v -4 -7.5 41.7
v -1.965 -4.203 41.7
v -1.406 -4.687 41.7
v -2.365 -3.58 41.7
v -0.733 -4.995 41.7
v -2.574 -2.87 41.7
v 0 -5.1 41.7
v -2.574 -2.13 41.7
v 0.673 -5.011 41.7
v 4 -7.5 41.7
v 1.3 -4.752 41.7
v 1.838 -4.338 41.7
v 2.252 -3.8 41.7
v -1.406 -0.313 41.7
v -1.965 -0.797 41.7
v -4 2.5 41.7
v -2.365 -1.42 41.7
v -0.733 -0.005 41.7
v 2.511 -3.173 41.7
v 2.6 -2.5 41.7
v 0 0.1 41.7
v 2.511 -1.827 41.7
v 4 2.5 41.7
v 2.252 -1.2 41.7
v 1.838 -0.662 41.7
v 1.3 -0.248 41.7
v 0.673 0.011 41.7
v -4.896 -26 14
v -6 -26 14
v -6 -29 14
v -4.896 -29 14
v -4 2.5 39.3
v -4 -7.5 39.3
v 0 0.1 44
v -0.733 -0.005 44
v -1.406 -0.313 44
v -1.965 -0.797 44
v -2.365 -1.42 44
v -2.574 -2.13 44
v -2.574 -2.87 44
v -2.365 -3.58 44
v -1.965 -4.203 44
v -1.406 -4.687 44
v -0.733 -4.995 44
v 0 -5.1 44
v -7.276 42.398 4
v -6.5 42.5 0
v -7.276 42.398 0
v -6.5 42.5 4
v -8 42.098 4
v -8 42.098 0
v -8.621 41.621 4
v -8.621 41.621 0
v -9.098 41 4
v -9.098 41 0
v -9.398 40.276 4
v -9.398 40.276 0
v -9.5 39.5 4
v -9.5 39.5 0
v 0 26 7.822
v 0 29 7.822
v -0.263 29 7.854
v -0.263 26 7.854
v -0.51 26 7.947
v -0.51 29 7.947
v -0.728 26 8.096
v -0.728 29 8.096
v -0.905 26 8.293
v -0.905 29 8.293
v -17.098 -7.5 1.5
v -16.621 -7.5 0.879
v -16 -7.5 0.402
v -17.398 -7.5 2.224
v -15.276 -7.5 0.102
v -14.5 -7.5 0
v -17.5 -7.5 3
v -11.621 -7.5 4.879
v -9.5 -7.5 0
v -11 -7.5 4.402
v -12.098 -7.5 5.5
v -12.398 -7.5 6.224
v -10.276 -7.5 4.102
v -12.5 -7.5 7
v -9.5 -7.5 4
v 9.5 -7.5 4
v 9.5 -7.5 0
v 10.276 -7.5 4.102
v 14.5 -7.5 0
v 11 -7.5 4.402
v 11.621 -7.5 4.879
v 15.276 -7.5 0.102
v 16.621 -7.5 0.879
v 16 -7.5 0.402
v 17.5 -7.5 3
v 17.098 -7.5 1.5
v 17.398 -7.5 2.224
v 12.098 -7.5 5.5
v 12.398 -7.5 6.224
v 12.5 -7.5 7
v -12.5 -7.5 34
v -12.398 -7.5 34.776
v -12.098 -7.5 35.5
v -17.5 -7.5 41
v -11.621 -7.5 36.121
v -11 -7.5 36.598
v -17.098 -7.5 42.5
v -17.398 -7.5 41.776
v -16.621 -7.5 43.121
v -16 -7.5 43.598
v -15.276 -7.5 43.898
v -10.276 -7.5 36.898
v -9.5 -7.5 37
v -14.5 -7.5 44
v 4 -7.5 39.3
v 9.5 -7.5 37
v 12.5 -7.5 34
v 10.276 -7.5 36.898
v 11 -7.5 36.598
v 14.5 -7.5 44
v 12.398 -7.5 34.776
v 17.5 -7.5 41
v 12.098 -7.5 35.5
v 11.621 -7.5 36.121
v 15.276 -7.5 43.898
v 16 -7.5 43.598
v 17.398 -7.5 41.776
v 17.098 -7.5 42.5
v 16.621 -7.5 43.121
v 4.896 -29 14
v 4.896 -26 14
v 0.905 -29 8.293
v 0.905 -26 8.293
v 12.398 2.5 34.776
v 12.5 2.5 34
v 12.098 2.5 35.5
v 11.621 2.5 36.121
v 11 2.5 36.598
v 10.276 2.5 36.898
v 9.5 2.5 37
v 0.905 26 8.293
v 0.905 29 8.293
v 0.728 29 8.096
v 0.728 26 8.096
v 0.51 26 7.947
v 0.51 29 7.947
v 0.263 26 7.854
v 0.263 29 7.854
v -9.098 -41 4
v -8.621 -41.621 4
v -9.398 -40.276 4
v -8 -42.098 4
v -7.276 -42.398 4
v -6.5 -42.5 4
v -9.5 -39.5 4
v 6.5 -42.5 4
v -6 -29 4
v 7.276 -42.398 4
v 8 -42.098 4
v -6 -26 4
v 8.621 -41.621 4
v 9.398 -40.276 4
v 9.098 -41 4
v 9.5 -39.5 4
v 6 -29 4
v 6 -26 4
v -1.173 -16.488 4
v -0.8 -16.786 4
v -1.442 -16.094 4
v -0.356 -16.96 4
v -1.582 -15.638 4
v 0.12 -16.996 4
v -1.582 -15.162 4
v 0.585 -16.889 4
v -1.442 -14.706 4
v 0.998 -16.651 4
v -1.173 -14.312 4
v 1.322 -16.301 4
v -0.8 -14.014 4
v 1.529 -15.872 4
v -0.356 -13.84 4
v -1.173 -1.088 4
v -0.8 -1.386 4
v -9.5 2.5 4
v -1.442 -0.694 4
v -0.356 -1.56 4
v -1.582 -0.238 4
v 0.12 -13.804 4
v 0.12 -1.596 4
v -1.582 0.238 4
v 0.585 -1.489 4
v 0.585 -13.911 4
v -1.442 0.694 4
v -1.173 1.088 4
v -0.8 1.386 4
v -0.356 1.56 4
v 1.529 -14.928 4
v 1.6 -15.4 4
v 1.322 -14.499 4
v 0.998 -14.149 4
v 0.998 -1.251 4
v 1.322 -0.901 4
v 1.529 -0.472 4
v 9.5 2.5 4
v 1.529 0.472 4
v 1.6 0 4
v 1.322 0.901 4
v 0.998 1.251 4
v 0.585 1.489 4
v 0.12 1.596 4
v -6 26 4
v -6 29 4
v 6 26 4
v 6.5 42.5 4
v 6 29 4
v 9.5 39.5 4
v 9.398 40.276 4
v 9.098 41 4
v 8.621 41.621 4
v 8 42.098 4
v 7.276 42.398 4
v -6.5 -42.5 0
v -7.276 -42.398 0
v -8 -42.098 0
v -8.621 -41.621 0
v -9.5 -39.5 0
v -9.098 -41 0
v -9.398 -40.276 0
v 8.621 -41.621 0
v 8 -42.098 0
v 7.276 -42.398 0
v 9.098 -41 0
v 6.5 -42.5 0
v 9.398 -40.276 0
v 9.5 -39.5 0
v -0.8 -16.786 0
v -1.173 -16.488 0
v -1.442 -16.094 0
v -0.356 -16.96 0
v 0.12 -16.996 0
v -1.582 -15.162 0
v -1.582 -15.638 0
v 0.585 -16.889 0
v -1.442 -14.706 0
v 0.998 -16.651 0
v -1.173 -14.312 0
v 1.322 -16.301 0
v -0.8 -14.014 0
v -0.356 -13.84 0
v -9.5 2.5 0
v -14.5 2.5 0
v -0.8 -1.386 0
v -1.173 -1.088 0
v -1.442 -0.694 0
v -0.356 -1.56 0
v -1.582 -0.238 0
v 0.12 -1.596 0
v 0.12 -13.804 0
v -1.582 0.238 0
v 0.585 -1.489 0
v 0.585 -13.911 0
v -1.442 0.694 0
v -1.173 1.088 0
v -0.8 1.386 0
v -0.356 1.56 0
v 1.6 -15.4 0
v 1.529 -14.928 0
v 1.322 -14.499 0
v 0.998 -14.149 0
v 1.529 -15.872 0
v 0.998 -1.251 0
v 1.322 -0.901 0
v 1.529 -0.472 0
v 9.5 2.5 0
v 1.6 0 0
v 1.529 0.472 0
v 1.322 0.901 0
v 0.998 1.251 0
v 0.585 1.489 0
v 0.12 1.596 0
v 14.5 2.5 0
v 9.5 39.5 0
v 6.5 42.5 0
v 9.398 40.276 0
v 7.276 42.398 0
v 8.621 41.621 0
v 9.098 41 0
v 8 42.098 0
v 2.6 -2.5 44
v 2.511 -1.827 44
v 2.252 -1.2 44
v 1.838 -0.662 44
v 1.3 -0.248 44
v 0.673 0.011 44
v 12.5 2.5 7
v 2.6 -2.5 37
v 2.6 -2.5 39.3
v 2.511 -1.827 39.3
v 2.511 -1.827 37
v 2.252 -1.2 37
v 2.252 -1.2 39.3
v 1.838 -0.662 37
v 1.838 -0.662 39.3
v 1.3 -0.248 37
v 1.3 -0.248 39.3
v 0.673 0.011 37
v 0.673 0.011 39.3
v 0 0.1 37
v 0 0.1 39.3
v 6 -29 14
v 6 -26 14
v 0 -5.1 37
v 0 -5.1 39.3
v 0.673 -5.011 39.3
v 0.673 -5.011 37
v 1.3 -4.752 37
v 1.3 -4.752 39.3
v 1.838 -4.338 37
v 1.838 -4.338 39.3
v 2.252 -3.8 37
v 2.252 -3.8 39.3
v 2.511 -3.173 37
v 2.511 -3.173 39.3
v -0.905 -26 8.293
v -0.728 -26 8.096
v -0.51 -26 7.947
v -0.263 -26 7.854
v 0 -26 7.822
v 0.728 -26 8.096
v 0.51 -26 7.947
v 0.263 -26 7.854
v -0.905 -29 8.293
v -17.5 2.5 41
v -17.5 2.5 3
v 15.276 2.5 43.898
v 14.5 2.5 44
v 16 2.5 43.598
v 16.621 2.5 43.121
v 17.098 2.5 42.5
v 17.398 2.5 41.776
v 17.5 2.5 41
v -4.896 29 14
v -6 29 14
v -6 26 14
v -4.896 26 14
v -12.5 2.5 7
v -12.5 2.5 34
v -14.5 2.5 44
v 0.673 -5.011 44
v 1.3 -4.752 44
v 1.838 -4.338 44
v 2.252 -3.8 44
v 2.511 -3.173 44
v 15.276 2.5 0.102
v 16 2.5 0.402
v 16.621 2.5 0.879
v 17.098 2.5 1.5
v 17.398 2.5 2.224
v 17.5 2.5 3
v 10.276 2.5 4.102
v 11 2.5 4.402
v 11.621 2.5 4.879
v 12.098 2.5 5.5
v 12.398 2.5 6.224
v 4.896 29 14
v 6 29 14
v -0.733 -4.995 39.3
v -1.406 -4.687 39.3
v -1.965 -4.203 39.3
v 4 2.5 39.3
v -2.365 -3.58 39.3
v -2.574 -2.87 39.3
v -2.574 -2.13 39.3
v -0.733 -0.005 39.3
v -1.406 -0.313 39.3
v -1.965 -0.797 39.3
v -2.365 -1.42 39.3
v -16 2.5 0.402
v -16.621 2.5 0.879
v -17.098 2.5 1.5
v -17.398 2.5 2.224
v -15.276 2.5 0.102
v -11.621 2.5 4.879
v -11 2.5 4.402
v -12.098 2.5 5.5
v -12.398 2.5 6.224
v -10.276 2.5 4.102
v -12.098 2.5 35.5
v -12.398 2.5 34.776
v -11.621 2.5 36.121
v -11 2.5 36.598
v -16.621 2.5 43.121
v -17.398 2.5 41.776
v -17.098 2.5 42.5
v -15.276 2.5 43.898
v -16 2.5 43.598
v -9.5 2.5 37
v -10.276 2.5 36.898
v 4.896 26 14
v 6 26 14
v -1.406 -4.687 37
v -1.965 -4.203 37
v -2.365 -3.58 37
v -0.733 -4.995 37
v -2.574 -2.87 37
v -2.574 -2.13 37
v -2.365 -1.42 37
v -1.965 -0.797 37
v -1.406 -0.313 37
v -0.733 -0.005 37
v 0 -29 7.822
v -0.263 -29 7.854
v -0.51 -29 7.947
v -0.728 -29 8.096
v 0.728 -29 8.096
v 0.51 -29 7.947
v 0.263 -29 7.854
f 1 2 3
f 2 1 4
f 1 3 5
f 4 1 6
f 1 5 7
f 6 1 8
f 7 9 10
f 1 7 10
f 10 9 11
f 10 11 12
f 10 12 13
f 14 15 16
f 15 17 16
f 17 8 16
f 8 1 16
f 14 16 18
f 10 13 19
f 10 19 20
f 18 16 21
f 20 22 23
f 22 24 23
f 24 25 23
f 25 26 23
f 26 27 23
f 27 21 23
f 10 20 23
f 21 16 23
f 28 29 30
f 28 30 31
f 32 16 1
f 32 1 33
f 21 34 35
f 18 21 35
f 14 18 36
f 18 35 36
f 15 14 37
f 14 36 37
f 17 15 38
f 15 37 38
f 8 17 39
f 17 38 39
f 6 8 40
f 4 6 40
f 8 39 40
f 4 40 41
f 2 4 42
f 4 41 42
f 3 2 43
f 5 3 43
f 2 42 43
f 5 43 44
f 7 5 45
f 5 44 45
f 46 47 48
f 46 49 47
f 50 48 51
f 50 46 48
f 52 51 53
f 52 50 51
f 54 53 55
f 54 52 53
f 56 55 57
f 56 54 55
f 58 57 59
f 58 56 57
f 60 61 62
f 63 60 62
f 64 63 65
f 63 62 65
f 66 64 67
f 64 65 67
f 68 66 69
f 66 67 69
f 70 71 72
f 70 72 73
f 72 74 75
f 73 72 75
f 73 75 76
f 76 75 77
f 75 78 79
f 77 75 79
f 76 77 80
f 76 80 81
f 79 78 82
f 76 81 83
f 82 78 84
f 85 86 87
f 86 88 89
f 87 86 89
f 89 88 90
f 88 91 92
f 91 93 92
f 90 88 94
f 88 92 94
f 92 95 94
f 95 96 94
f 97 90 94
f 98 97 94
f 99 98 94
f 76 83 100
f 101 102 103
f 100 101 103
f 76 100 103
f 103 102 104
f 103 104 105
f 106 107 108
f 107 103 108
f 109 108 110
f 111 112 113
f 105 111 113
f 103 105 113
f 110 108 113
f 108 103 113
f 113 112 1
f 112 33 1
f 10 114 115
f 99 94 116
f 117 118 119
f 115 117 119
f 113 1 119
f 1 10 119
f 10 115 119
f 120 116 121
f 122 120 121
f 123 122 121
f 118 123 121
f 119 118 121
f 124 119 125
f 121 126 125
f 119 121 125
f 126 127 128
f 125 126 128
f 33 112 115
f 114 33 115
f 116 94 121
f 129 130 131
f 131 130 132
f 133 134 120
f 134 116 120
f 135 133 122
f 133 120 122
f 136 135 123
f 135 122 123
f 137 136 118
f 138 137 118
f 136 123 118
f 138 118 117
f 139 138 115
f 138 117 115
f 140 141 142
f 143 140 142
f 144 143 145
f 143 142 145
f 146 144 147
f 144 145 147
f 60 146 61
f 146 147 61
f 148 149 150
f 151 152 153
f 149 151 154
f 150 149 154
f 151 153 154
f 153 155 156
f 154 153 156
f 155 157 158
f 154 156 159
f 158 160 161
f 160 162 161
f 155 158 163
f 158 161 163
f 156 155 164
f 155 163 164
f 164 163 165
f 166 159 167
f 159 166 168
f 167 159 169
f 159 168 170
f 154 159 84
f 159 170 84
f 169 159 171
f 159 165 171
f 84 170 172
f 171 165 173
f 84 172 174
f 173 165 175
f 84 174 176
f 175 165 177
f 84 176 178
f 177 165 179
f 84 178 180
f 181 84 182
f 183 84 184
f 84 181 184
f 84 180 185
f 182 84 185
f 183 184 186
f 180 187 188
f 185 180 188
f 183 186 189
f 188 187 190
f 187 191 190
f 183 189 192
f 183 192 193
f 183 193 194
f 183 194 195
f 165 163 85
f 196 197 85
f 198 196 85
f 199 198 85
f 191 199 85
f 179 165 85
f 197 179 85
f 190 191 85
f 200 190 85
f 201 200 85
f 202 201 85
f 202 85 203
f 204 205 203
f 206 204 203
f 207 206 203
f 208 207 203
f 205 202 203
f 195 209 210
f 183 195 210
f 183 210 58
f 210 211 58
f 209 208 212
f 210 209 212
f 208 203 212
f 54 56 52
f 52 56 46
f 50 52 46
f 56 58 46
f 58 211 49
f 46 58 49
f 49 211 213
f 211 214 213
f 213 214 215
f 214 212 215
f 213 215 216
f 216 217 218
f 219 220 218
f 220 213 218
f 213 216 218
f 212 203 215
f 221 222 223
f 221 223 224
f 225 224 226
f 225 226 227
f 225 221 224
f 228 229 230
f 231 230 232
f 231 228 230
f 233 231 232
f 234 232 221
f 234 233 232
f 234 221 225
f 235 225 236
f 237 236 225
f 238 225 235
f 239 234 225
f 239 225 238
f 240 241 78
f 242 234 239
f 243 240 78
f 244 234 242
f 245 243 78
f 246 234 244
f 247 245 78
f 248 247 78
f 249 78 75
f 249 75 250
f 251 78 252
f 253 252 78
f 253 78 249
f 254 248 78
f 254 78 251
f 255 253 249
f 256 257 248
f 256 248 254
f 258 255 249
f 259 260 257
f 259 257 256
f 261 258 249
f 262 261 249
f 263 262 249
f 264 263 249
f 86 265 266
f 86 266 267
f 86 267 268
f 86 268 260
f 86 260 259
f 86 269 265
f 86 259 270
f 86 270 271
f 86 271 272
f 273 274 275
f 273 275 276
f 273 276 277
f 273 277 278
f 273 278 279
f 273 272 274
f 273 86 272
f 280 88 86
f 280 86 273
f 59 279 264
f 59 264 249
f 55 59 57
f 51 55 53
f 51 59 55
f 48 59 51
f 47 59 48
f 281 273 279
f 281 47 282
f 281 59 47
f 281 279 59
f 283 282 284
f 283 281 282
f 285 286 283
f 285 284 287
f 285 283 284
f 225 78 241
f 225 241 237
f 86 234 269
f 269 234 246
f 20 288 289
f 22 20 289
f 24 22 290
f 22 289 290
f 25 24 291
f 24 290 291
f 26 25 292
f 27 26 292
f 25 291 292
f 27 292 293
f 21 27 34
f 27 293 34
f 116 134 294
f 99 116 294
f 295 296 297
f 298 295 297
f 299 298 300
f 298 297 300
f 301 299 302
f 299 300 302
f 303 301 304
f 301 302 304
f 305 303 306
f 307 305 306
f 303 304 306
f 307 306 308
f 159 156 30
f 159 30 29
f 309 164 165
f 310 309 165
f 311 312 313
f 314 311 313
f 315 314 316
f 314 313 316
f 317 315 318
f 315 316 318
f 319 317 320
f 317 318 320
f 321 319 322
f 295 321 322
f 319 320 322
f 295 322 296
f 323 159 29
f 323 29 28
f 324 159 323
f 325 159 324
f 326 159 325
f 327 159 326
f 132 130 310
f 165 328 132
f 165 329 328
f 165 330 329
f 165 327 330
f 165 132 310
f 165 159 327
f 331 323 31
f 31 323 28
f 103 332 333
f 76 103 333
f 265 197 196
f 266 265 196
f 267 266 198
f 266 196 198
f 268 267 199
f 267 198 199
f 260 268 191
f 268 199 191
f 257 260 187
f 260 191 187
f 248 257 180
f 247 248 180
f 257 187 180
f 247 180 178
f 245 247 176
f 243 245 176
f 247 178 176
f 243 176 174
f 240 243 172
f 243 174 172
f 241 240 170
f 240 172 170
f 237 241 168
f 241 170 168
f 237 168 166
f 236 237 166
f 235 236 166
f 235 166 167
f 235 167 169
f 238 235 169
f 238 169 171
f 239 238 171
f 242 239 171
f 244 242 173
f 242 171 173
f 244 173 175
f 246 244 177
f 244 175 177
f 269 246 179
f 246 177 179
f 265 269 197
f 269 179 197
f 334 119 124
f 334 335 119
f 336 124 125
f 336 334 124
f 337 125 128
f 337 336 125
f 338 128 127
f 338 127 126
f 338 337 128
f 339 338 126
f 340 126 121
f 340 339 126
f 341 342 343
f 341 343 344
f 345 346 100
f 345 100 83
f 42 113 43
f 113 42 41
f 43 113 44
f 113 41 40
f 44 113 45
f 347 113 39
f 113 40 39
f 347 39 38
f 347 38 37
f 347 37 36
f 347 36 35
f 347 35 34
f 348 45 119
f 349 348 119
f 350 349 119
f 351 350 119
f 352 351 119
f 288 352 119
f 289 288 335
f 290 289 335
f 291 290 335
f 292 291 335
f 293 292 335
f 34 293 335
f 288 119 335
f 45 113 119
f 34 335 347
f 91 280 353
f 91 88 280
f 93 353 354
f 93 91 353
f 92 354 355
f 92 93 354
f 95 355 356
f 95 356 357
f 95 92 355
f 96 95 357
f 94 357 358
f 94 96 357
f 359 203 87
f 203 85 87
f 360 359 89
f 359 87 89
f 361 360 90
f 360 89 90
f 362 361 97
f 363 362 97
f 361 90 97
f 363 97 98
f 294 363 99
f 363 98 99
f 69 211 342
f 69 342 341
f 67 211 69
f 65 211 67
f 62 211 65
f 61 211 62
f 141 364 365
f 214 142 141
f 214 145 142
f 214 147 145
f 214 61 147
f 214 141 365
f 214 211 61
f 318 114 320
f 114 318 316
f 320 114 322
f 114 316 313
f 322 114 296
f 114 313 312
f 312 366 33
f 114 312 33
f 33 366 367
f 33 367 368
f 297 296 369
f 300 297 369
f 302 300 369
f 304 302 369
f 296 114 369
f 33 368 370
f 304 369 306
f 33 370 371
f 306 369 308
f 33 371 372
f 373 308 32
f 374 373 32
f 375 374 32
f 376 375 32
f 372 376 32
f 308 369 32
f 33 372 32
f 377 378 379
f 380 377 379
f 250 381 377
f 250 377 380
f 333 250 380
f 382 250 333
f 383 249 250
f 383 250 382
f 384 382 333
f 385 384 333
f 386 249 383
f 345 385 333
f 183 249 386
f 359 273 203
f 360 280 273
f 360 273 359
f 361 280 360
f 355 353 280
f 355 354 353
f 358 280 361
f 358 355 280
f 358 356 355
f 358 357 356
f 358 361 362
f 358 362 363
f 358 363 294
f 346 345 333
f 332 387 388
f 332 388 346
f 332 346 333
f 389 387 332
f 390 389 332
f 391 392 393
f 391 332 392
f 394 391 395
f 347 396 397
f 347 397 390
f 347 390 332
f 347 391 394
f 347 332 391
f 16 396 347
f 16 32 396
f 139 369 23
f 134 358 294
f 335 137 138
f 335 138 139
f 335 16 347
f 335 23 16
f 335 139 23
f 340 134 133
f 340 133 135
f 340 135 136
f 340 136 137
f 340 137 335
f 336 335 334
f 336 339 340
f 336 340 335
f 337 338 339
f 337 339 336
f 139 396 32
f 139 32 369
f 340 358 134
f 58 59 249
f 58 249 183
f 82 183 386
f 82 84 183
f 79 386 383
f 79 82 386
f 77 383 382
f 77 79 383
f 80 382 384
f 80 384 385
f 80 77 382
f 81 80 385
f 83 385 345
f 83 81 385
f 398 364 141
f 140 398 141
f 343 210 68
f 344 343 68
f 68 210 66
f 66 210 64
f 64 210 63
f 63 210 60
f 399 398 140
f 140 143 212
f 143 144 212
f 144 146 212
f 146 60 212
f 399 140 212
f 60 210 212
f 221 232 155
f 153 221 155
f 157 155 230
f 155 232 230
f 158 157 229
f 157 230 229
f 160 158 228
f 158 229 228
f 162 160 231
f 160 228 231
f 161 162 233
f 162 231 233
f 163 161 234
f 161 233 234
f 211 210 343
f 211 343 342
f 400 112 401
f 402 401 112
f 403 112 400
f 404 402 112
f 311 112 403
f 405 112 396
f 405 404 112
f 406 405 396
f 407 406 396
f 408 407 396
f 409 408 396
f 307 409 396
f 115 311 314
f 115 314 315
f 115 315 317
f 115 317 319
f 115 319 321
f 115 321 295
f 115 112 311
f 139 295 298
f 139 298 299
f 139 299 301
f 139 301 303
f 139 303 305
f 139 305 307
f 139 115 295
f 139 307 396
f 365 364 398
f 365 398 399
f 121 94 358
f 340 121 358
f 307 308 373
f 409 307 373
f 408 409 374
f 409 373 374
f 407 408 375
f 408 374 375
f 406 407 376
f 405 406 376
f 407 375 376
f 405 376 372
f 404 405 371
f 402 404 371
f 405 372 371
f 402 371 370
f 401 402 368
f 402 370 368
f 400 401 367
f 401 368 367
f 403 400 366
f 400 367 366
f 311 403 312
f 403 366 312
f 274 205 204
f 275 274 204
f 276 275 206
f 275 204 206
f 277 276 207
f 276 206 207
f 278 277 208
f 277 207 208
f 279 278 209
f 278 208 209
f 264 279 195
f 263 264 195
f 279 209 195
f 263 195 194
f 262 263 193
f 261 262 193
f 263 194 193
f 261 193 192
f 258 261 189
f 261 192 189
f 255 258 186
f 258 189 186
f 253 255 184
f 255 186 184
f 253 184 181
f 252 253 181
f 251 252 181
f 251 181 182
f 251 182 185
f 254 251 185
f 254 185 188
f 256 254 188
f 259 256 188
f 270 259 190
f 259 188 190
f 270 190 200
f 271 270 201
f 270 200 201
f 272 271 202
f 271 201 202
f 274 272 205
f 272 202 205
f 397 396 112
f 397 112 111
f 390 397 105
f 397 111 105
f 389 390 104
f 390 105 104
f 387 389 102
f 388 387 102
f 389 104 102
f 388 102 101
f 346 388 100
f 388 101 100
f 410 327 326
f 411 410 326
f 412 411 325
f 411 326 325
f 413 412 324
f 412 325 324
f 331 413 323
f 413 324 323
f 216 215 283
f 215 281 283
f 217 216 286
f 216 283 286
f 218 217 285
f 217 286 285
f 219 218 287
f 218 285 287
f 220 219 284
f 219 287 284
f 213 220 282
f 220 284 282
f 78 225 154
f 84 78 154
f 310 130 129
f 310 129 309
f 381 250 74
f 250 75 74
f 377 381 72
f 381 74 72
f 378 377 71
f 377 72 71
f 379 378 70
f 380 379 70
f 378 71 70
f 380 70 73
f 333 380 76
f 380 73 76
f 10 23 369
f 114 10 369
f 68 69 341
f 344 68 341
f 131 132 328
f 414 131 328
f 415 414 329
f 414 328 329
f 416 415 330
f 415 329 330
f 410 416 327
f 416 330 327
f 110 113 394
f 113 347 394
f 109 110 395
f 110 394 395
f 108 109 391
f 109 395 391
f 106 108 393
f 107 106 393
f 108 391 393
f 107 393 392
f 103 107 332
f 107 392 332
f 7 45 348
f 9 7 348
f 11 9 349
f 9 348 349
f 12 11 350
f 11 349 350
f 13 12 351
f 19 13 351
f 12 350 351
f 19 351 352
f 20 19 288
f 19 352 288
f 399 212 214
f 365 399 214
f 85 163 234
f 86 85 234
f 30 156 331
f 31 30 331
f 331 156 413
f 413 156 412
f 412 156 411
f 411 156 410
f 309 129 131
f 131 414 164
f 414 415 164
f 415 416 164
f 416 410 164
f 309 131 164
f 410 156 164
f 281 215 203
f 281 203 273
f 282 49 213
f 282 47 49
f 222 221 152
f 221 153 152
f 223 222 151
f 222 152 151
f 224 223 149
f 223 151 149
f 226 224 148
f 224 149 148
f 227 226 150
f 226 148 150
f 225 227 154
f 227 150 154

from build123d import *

# Parameters (mm, degrees)
SKETCH1_W           = 15
SKETCH1_H           = 85
BOSS_EXTRUDE1_DEPTH = 4
SKETCH2_W           = 12
SKETCH2_H           = 3
BOSS_EXTRUDE2_DEPTH = 10
CUT_EXTRUDE1_DEPTH  = 60
SKETCH4_R           = 1.6
CUT_EXTRUDE2_DEPTH  = 4
SKETCH5_W           = 10
SKETCH5_H           = 4
BOSS_EXTRUDE3_DEPTH = 50
SKETCH8_W           = 10
SKETCH8_H           = 40
CUT_EXTRUDE3_DEPTH  = 4
SKETCH10_W          = 10
SKETCH10_H          = 10
BOSS_EXTRUDE4_DEPTH = 40
SKETCH11_W          = 7
SKETCH11_H          = 10
BOSS_EXTRUDE5_DEPTH = 15
SKETCH13_W          = 5
SKETCH13_H          = 33
CUT_EXTRUDE4_DEPTH  = 10
CUT_EXTRUDE6_DEPTH  = 7
SKETCH17_W          = 4
SKETCH17_H          = 35
SKETCH17_H_2        = 40
BOSS_EXTRUDE6_DEPTH = 2
SKETCH18_W          = 4
SKETCH18_H          = 35
SKETCH18_H_2        = 40
BOSS_EXTRUDE7_DEPTH = 2
FILLET2_R           = 3
SKETCH19_W          = 4
SKETCH19_H          = 2.4
CUT_EXTRUDE7_DEPTH  = 10


with BuildPart() as part:
    # Sketch1 → Boss-Extrude1 (new body)
    with BuildSketch(Plane.XY):
        Rectangle(SKETCH1_W, SKETCH1_H)
    extrude(amount=BOSS_EXTRUDE1_DEPTH)

    # Sketch2 → Boss-Extrude2 (add)
    with BuildSketch(Plane.XY.offset(4)):
        with Locations((0, 27.5)):
            Rectangle(SKETCH2_W, SKETCH2_H)
        with Locations((0, -27.5)):
            Rectangle(SKETCH2_W, SKETCH2_H)
    extrude(amount=BOSS_EXTRUDE2_DEPTH)

    # Sketch3 → Cut-Extrude1 (cut)
    with BuildSketch(Plane(origin=(0, 29, 0), x_dir=(1, 0, 0), z_dir=(0, 1, 0))):
        with BuildLine():
            Line((0, -7.82217465), (0, -14))
            Line((0, -14), (4.896029025, -14))
            Line((4.896029025, -14), (0.904649293, -8.293404311))
            ThreePointArc((0.904649293, -8.293404311), (0.5100117, -7.947044007), (0, -7.82217465))
        make_face()
        with BuildLine():
            Line((-4.896029025, -14), (0, -14))
            Line((0, -14), (0, -7.82217465))
            ThreePointArc((0, -7.82217465), (-0.5100117, -7.947044007), (-0.904649293, -8.293404311))
            Line((-0.904649293, -8.293404311), (-4.896029025, -14))
        make_face()
    extrude(amount=-CUT_EXTRUDE1_DEPTH, mode=Mode.SUBTRACT)

    # Sketch4 → Cut-Extrude2 (cut)
    with BuildSketch(Plane.XY.offset(4)):
        with Locations((0, -15.4)):
            Circle(SKETCH4_R)
        Circle(SKETCH4_R)
    extrude(amount=-CUT_EXTRUDE2_DEPTH, mode=Mode.SUBTRACT)

    # Sketch5 → Boss-Extrude3 (add)
    with BuildSketch(Plane(origin=(0, 42.5, 0), x_dir=(1, 0, 0), z_dir=(0, 1, 0))):
        with Locations((12.5, -2)):
            Rectangle(SKETCH5_W, SKETCH5_H)
        with Locations((-12.5, -2)):
            Rectangle(SKETCH5_W, SKETCH5_H)
    extrude(amount=-BOSS_EXTRUDE3_DEPTH)

    # Sketch8 → Cut-Extrude3 (cut)
    with BuildSketch(Plane.XY.offset(4)):
        with Locations((12.5, 22.5)):
            Rectangle(SKETCH8_W, SKETCH8_H)
        with Locations((-12.5, 22.5)):
            Rectangle(SKETCH8_W, SKETCH8_H)
    extrude(amount=-CUT_EXTRUDE3_DEPTH, mode=Mode.SUBTRACT)

    # Sketch10 → Boss-Extrude4 (add)
    with BuildSketch(Plane.XY.offset(4)):
        with Locations((12.5, -2.5)):
            Rectangle(SKETCH10_W, SKETCH10_H)
        with Locations((-12.5, -2.5)):
            Rectangle(SKETCH10_W, SKETCH10_H)
    extrude(amount=BOSS_EXTRUDE4_DEPTH)

    # Sketch11 → Boss-Extrude5 (add)
    with BuildSketch(Plane.ZY.offset(-7.5)):
        with Locations((40.5, -2.5)):
            Rectangle(SKETCH11_W, SKETCH11_H)
    extrude(amount=BOSS_EXTRUDE5_DEPTH)

    # Sketch13 → Cut-Extrude4 (cut)
    with BuildSketch(Plane(origin=(0, 2.5, 0), x_dir=(1, 0, 0), z_dir=(0, 1, 0))):
        with Locations((-10, -20.5)):
            Rectangle(SKETCH13_W, SKETCH13_H)
        with Locations((10, -20.5)):
            Rectangle(SKETCH13_W, SKETCH13_H)
    extrude(amount=-CUT_EXTRUDE4_DEPTH, mode=Mode.SUBTRACT)

    # Sketch14 → Cut-Extrude6 (cut)
    with BuildSketch(Plane.XY.offset(44)):
        with BuildLine():
            ThreePointArc((0, 0.1), (-2.6, -2.5), (0, -5.1))
            Line((0, -5.1), (0, 0.1))
        make_face()
        with BuildLine():
            Line((0, 0.1), (0, -5.1))
            ThreePointArc((0, -5.1), (1.838477631, -4.338477631), (2.6, -2.5))
            ThreePointArc((2.6, -2.5), (1.838477631, -0.661522369), (0, 0.1))
        make_face()
    extrude(amount=-CUT_EXTRUDE6_DEPTH, mode=Mode.SUBTRACT)

    # Sketch17 → Boss-Extrude6 (add)
    with BuildSketch(Plane(origin=(7.5, 0, 0), x_dir=(0, 0, -1), z_dir=(1, 0, 0))):
        with Locations((-2, -25)):
            Rectangle(SKETCH17_W, SKETCH17_H)
        with Locations((-2, 22.5)):
            Rectangle(SKETCH17_W, SKETCH17_H_2)
    extrude(amount=BOSS_EXTRUDE6_DEPTH)

    # Sketch18 → Boss-Extrude7 (add)
    with BuildSketch(Plane.ZY.offset(7.5)):
        with Locations((2, -25)):
            Rectangle(SKETCH18_W, SKETCH18_H)
        with Locations((2, 22.5)):
            Rectangle(SKETCH18_W, SKETCH18_H_2)
    extrude(amount=BOSS_EXTRUDE7_DEPTH)

    # Fillet2
    fillet2_edges = [part.edges().sort_by_distance(p)[0] for p in [
        (9.5, -42.5, 2),
        (-9.5, -42.5, 2),
        (9.5, 42.5, 2),
        (-9.5, 42.5, 2),
        (-17.5, -2.5, 0),
        (17.5, -2.5, 44),
        (17.5, -2.5, 0),
        (-17.5, -2.5, 44),
        (12.5, -2.5, 37),
        (-12.5, -2.5, 37),
        (12.5, -2.5, 4),
        (-12.5, -2.5, 4),
    ]]
    fillet(fillet2_edges, radius=FILLET2_R)

    # Sketch19 → Cut-Extrude7 (cut)
    with BuildSketch(Plane(origin=(0, 2.5, 0), x_dir=(1, 0, 0), z_dir=(0, 1, 0))):
        with Locations((-2, -40.5)):
            Rectangle(SKETCH19_W, SKETCH19_H)
        with Locations((2, -40.5)):
            Rectangle(SKETCH19_W, SKETCH19_H)
    extrude(amount=-CUT_EXTRUDE7_DEPTH, mode=Mode.SUBTRACT)


solid = part.part
